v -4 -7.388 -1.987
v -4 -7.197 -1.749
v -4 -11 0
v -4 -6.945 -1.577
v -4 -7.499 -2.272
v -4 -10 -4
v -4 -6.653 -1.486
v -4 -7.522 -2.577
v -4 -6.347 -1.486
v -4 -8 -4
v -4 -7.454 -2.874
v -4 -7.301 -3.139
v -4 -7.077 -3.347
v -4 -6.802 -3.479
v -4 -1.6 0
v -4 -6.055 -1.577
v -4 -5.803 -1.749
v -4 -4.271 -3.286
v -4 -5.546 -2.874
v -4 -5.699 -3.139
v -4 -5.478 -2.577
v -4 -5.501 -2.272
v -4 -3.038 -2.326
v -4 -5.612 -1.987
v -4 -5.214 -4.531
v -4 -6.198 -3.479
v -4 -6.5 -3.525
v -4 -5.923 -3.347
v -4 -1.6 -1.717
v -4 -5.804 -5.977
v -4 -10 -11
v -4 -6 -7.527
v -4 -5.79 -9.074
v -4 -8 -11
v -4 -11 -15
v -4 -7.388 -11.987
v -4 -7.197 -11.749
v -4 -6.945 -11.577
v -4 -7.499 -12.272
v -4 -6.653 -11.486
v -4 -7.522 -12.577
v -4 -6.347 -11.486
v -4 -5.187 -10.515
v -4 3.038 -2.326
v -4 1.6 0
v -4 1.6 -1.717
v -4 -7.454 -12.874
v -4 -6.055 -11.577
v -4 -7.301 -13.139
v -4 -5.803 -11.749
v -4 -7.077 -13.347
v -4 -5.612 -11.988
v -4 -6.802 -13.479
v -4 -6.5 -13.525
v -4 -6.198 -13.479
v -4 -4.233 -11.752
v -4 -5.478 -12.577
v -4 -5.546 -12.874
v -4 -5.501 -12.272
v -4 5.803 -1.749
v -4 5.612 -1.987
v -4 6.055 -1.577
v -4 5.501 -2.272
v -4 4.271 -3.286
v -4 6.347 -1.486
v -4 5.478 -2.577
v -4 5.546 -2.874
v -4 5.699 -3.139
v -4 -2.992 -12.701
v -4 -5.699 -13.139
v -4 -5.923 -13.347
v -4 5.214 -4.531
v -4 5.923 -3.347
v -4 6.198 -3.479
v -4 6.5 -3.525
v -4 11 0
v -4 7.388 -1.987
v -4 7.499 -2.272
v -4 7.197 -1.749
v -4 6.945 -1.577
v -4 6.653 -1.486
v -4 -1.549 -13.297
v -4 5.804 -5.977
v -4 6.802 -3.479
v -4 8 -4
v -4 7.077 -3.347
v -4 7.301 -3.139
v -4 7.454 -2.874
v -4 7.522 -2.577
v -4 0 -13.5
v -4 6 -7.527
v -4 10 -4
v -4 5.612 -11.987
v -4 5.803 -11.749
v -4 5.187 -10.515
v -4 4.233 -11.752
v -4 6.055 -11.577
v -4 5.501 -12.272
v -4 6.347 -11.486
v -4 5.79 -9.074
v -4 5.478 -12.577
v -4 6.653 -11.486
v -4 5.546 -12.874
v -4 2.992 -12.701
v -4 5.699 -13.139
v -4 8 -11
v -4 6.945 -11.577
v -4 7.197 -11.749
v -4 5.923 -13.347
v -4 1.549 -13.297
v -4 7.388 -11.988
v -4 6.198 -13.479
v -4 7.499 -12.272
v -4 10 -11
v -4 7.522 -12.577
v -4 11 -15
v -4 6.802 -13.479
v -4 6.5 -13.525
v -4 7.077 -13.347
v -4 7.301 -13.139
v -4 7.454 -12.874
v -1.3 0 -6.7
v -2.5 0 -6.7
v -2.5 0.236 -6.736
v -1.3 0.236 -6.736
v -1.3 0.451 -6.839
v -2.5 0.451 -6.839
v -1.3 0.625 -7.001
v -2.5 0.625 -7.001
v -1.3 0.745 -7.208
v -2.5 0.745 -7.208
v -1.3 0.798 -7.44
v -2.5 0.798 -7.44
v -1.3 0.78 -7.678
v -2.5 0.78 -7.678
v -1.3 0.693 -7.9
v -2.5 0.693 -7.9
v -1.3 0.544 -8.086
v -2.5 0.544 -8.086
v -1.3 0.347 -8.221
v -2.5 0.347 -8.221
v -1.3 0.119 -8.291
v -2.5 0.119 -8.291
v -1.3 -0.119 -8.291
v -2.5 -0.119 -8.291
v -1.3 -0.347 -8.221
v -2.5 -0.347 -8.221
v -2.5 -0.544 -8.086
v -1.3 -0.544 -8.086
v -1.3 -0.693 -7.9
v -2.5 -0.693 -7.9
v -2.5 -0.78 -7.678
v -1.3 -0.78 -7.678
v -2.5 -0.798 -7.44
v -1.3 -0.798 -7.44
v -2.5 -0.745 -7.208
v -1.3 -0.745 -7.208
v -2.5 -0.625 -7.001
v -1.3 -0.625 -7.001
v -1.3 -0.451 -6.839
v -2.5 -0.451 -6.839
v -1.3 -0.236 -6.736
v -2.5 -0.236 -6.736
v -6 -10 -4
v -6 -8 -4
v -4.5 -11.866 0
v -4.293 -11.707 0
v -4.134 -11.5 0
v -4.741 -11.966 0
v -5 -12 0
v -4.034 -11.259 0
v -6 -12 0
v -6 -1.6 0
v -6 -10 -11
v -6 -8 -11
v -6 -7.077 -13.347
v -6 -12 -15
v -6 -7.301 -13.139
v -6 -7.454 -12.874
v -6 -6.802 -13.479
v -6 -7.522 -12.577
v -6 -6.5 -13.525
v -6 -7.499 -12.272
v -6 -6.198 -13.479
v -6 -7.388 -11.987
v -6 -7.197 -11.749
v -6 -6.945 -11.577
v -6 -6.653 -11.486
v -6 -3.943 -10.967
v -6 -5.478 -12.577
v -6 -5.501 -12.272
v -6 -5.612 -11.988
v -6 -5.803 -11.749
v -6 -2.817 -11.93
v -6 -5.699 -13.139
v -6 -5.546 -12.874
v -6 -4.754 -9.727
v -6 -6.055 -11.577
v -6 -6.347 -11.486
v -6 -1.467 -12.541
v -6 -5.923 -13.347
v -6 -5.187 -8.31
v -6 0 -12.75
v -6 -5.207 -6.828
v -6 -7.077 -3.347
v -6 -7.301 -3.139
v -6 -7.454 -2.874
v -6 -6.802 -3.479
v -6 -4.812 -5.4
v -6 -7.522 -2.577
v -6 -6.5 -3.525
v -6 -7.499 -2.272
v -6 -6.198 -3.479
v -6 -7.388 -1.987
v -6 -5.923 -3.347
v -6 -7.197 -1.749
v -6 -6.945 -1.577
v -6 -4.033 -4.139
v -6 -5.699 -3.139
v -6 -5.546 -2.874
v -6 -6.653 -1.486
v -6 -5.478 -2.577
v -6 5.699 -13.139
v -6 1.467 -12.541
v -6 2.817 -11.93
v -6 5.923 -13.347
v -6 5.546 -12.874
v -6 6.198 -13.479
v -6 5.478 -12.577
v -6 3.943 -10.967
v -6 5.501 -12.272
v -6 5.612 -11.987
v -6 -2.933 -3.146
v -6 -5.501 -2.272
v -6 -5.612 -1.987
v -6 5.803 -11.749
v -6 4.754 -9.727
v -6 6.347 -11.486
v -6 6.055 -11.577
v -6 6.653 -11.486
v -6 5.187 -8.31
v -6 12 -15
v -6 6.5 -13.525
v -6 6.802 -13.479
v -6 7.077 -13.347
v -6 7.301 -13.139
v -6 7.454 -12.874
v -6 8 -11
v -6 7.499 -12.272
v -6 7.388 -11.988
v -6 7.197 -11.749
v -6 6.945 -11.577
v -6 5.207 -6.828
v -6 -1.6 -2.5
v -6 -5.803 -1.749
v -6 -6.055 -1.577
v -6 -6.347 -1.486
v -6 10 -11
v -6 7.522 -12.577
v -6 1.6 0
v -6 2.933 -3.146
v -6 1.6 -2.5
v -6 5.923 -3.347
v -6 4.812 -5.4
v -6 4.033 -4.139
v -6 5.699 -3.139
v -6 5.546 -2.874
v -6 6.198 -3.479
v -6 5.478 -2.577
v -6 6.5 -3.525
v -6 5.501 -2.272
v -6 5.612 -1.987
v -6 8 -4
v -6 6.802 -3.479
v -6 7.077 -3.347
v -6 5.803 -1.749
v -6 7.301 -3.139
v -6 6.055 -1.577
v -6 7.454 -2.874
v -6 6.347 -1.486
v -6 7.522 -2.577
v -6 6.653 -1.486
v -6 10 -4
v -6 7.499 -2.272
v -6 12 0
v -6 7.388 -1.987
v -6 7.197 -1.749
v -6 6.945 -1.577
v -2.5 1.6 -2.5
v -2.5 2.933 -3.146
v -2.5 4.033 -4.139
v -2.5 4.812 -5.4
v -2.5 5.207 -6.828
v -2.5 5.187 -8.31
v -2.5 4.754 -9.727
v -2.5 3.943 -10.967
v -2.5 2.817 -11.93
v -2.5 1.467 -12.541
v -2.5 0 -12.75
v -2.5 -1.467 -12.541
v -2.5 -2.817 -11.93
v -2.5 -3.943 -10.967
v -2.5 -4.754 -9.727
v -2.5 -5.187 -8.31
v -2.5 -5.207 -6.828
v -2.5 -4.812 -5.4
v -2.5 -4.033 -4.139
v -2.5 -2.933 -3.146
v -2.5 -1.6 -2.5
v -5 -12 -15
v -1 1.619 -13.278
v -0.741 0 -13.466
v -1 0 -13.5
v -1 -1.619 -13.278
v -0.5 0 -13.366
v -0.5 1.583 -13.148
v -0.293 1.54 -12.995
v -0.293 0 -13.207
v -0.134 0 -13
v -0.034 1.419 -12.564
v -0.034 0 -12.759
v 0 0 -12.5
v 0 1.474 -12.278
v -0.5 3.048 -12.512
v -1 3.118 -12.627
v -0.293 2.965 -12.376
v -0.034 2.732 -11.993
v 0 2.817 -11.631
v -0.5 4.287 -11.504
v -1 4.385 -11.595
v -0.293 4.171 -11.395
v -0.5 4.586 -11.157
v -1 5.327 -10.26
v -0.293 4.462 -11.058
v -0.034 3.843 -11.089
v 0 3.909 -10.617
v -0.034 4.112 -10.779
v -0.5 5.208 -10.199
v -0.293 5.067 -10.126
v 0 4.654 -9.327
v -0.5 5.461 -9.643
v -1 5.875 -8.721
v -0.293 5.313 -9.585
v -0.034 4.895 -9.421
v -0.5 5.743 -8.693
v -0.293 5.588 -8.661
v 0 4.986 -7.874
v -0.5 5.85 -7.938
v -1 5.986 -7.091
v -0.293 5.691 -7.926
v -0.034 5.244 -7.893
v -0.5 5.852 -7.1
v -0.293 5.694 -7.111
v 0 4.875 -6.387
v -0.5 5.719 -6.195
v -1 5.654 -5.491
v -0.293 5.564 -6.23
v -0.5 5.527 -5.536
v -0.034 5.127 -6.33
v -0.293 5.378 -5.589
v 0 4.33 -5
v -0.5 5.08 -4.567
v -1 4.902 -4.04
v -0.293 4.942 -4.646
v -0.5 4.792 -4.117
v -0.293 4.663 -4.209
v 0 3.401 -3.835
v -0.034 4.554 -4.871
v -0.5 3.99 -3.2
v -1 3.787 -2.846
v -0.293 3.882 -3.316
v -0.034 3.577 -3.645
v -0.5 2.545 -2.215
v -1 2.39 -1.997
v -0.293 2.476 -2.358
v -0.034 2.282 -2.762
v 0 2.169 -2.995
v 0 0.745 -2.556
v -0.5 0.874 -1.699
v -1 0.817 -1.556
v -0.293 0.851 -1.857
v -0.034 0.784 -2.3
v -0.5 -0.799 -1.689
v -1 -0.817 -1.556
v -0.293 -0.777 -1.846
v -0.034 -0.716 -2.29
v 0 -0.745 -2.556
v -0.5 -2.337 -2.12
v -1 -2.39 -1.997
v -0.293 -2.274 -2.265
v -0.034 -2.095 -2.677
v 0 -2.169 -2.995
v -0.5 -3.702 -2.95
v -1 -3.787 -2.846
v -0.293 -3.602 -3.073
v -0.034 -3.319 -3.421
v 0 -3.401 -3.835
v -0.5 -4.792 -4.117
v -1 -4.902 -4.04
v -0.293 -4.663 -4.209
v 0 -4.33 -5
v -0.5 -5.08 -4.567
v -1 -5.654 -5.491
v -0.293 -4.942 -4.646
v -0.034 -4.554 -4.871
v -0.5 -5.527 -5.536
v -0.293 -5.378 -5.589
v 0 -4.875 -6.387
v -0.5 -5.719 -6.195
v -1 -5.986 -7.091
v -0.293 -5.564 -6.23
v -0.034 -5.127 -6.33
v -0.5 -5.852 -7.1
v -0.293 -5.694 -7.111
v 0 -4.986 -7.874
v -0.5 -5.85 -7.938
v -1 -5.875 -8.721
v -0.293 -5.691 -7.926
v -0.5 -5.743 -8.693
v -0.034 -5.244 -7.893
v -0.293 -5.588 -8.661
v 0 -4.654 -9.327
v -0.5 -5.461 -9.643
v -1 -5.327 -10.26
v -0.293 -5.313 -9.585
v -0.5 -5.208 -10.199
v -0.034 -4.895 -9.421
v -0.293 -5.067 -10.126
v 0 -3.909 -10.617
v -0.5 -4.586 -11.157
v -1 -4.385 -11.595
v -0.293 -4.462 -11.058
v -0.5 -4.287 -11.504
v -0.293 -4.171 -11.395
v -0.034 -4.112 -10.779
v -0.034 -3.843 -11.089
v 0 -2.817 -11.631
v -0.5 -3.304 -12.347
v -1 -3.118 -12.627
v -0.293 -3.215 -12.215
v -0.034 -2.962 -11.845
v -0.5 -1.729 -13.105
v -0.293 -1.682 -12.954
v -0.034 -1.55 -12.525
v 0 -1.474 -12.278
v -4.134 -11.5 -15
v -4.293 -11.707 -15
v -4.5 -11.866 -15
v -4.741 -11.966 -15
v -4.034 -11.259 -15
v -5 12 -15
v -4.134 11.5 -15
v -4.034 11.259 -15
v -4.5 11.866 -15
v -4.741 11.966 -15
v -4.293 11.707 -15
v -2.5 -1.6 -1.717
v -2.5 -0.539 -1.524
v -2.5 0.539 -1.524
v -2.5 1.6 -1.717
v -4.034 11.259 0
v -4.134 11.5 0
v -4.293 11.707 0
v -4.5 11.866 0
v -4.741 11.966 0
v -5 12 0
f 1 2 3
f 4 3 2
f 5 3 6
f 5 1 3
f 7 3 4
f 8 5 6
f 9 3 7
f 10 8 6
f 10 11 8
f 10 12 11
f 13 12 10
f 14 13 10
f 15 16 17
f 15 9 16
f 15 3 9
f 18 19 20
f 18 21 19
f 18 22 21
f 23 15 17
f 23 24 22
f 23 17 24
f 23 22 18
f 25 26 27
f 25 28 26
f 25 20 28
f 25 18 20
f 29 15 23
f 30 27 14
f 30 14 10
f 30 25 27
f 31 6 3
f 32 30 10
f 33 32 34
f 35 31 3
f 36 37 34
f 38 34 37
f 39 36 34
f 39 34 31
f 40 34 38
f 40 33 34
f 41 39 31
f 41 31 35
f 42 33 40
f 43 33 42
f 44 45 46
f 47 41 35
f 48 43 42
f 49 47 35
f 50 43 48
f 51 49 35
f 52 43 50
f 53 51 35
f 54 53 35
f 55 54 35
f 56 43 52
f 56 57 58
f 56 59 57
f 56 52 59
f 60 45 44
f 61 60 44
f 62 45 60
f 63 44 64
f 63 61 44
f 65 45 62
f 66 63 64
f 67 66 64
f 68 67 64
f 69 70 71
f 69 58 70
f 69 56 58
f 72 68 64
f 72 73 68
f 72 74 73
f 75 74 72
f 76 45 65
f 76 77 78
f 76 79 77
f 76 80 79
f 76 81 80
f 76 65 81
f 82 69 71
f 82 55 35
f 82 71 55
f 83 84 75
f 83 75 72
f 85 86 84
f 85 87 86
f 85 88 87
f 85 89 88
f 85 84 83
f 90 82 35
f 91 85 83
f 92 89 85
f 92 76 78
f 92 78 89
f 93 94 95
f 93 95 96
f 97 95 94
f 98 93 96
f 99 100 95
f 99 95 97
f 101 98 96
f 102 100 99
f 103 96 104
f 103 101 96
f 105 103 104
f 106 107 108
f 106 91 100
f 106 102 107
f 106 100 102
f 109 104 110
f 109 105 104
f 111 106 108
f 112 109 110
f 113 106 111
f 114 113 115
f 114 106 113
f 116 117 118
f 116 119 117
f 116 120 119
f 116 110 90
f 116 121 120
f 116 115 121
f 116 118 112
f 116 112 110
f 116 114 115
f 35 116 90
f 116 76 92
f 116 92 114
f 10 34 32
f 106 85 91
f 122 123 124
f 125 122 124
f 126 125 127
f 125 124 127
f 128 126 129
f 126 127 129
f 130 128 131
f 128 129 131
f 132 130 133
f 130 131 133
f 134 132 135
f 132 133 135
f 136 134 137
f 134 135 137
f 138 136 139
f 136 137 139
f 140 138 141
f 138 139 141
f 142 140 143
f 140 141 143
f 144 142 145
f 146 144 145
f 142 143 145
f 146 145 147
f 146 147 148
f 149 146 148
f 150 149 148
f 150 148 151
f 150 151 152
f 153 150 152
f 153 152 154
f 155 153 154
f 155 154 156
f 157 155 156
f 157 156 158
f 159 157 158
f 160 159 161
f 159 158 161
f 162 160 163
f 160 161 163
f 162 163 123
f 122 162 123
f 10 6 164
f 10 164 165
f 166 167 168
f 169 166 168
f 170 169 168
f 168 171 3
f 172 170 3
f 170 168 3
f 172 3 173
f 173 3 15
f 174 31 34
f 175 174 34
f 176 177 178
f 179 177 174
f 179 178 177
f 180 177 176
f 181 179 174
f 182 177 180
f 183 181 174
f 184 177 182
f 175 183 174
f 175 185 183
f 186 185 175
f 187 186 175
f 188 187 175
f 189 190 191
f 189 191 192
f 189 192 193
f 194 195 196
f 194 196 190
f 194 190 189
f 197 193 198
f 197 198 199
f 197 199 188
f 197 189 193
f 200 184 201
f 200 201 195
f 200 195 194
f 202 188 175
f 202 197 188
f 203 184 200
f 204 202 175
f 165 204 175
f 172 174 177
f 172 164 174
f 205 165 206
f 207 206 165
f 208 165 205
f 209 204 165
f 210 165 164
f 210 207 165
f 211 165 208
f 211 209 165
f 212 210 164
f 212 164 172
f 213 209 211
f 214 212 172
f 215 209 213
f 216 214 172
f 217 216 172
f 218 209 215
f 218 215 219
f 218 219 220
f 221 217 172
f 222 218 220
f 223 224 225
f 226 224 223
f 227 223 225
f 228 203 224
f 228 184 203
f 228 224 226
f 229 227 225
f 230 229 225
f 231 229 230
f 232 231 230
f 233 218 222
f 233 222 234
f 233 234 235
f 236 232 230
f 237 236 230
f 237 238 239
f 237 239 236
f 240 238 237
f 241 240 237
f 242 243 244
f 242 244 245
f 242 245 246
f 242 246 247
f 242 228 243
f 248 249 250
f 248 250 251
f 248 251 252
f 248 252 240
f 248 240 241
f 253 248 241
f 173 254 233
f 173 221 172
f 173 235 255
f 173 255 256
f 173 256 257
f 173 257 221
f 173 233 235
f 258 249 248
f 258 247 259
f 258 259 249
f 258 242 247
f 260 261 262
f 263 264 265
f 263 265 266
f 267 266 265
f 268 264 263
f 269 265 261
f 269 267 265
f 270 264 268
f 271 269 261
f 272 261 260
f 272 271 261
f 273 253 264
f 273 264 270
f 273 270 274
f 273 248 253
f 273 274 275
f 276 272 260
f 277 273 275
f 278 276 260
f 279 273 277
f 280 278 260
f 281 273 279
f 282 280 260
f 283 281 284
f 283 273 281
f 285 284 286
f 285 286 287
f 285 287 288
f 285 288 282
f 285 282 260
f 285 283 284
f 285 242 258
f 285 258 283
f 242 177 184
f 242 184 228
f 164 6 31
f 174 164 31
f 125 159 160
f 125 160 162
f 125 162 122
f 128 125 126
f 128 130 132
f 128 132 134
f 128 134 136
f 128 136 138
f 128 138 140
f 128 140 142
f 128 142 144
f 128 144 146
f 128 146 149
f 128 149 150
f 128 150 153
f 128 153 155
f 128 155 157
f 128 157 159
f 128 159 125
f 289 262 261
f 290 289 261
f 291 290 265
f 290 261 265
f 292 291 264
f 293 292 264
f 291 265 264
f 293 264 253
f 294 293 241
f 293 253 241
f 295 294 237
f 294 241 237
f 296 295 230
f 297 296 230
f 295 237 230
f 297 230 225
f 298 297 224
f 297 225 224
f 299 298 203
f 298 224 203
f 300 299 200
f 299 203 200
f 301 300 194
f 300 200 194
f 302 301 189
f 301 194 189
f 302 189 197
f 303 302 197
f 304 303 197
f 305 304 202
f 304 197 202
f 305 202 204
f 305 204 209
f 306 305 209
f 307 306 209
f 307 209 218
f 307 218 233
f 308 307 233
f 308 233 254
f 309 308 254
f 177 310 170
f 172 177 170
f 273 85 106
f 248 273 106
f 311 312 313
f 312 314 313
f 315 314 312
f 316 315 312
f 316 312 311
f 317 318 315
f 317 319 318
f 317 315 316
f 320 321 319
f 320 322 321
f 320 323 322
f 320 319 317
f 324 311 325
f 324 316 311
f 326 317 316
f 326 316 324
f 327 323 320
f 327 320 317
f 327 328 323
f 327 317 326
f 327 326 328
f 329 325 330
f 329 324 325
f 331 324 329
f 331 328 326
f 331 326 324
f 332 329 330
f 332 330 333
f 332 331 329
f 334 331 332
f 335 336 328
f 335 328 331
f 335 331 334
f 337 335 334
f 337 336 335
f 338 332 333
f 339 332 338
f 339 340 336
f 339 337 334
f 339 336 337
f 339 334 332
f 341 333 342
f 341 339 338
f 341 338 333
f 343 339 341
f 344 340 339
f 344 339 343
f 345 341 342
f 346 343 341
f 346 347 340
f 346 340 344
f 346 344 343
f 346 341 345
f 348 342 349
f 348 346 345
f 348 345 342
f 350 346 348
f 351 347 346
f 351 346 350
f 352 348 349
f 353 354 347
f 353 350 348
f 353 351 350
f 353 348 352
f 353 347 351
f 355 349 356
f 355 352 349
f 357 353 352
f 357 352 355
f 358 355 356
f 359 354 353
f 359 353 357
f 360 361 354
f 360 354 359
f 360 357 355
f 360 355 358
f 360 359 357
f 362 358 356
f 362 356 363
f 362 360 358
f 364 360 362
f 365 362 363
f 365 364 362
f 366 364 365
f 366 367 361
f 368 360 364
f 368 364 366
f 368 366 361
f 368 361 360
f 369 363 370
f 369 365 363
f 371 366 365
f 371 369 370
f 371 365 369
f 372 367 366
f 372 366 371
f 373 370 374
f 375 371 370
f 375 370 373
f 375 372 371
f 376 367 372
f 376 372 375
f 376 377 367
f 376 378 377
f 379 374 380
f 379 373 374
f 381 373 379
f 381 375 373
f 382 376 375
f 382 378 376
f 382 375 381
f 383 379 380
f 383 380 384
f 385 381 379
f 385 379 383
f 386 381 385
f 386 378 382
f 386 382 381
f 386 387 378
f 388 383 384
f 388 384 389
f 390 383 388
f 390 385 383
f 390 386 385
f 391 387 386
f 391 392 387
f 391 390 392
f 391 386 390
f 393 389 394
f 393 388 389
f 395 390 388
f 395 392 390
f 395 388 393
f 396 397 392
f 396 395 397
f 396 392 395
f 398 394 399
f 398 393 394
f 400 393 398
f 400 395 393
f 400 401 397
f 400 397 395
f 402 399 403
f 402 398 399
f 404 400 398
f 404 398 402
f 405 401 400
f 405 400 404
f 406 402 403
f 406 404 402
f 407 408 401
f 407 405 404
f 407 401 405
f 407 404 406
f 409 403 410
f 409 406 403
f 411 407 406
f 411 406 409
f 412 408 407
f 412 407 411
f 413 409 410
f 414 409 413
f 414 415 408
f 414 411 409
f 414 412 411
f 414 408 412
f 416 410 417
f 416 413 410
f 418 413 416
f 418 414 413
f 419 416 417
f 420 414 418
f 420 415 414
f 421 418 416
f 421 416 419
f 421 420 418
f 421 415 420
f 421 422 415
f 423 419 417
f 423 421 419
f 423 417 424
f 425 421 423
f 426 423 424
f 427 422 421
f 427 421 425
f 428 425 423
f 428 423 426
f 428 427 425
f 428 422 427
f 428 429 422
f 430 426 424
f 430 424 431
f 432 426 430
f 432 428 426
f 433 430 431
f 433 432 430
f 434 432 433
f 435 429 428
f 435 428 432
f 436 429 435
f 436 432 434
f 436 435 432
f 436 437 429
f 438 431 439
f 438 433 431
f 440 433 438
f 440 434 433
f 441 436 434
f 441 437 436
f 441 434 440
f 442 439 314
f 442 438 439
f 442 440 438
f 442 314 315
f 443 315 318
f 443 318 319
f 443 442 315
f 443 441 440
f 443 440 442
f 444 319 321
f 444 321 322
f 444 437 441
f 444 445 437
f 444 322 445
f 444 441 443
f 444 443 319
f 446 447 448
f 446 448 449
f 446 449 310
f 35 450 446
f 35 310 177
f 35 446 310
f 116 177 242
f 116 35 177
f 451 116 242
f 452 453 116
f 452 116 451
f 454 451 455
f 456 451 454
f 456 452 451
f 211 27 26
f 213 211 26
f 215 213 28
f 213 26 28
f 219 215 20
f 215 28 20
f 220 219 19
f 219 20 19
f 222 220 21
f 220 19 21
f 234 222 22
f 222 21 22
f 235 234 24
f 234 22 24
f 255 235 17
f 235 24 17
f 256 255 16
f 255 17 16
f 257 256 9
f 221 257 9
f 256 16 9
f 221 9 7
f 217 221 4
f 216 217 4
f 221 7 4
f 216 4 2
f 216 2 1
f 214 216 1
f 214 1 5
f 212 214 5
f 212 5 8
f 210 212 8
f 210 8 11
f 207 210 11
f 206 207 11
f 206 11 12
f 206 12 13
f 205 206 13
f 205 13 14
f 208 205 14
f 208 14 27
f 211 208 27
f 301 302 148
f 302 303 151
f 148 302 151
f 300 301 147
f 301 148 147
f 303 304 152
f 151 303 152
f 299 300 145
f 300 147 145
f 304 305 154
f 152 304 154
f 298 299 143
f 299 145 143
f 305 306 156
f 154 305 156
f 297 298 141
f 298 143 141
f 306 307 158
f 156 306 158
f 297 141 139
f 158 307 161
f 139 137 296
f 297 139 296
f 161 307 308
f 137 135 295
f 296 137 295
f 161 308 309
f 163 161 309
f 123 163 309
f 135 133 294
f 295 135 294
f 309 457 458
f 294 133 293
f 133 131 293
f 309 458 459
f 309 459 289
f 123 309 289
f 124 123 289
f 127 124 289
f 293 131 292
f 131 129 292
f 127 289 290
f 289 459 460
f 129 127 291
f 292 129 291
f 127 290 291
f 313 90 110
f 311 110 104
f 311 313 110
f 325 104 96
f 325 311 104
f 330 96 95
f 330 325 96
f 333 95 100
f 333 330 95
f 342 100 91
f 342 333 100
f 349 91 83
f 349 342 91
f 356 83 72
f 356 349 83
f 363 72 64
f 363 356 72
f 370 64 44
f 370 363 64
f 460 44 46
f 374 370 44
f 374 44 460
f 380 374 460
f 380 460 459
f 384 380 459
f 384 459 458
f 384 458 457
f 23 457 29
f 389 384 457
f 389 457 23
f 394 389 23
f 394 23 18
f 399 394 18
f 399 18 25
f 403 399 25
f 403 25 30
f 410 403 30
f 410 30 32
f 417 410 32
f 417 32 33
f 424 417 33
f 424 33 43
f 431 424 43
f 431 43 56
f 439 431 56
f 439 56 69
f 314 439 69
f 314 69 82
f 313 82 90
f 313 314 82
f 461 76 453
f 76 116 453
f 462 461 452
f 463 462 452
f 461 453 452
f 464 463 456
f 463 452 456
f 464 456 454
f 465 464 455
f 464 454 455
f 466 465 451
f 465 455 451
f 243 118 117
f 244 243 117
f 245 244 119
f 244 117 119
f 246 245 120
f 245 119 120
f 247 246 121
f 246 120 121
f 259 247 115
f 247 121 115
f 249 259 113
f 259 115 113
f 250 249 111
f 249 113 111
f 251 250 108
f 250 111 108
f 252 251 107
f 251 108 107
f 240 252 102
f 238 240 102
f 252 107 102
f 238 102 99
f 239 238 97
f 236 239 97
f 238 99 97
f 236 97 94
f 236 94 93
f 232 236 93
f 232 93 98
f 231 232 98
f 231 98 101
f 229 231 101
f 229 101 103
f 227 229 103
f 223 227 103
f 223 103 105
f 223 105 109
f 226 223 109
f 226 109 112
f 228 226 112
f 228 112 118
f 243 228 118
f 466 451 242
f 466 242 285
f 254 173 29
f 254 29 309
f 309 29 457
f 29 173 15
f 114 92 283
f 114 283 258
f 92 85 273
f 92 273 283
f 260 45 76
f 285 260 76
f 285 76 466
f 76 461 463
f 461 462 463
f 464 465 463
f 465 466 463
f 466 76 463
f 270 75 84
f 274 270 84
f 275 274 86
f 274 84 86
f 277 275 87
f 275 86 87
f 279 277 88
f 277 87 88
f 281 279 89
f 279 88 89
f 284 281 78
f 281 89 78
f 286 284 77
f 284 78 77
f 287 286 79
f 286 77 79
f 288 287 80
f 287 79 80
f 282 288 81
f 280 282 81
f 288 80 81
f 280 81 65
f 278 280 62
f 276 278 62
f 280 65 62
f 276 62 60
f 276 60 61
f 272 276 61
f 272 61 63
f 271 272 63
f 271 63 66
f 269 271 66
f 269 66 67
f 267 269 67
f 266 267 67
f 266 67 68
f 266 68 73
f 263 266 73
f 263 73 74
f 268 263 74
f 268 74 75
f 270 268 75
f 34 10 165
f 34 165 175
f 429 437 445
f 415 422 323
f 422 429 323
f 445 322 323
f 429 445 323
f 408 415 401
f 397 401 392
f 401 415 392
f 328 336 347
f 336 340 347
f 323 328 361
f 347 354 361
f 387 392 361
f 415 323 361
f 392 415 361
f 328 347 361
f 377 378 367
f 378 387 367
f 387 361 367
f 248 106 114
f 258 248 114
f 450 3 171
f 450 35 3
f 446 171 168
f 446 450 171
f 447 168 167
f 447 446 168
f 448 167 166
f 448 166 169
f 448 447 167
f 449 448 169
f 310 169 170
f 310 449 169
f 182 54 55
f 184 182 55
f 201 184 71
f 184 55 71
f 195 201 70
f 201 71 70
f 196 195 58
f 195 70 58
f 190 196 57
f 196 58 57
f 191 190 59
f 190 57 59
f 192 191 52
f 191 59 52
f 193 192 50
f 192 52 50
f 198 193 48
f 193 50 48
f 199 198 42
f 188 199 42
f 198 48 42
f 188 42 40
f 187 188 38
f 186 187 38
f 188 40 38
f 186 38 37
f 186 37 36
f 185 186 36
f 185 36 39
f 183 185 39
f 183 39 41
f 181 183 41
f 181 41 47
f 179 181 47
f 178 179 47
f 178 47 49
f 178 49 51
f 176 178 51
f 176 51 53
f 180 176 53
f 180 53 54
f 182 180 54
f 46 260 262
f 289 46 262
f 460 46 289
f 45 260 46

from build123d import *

# Parameters (mm, degrees)
SKETCH1_W                    = 15
SKETCH1_H                    = 24
BOSS_EXTRUDE1_DEPTH          = 6
SKETCH2_R                    = 5.25
CUT_EXTRUDE1_DEPTH           = 3.5
CUT_EXTRUDE2_REACH           = 24.136
CUT_EXTRUDE2_END_RADIUS      = 5.25
SKETCH3_W                    = 3.5
SKETCH3_H                    = 3.2
SKETCH4_W                    = 7
SKETCH4_H                    = 2
CUT_EXTRUDE3_DEPTH           = 10
SKETCH5_R                    = 0.8
CUT_EXTRUDE4_DEPTH           = 1.2
SKETCH6_OUTSIDE_W            = 22.786
SKETCH6_OUTSIDE_H            = 31.786
SKETCH6_OUTSIDE_R            = 6
CUT_EXTRUDE5_DEPTH           = 4
M2_5X0_45_TAPPED_HOLE1_D     = 2.05
M2_5X0_45_TAPPED_HOLE1_DEPTH = 6.35
M2_5X0_45_TAPPED_HOLE1_TIP   = 0.615882135
FILLET1_R                    = 1


with BuildPart() as part:
    # Sketch1 → Boss-Extrude1 (new body)
    with BuildSketch(Plane(origin=(0, 0, -7.5), x_dir=(0, 0, 1), z_dir=(-1, 0, 0))):
        Rectangle(SKETCH1_W, SKETCH1_H)
    extrude(amount=BOSS_EXTRUDE1_DEPTH)

    # Sketch2 → Cut-Extrude1 (cut)
    with BuildSketch(Plane.ZY.offset(6)):
        with Locations((-7.5, 0)):
            Circle(SKETCH2_R)
    extrude(amount=-CUT_EXTRUDE1_DEPTH, mode=Mode.SUBTRACT)

    # Cut-Extrude2: up to this cylinder (the profile starts outside it)
    cut_extrude2_end = Plane(origin=(-4.25, 0, -7.5), z_dir=(-1, 0, 0)) * Cylinder(CUT_EXTRUDE2_END_RADIUS, 59.772, mode=Mode.PRIVATE)
    # Sketch3 → Cut-Extrude2 (cut, up to the surface)
    with BuildSketch(Plane(origin=(5, 0, 0), x_dir=(1, 0, 0), z_dir=(0, 0, 1)), mode=Mode.PRIVATE) as cut_extrude2_sk1:
        with Locations((-9.25, 0)):
            Rectangle(SKETCH3_W, SKETCH3_H)
    cut_extrude2_tool1 = extrude(cut_extrude2_sk1.sketch, amount=-CUT_EXTRUDE2_REACH, mode=Mode.PRIVATE) - cut_extrude2_end
    add(cut_extrude2_tool1.solids().sort_by_distance((-4.25, 0, 0))[0], mode=Mode.SUBTRACT)

    # Sketch4 → Cut-Extrude3 (cut)
    with BuildSketch(Plane(origin=(0, 0, 0), x_dir=(0, 0, -1), z_dir=(1, 0, 0))):
        with Locations((7.5, 9)):
            Rectangle(SKETCH4_W, SKETCH4_H)
        with Locations((7.5, -9)):
            Rectangle(SKETCH4_W, SKETCH4_H)
    extrude(amount=-CUT_EXTRUDE3_DEPTH, mode=Mode.SUBTRACT)

    # Sketch5 → Cut-Extrude4 (cut)
    with BuildSketch(Plane.ZY.offset(2.5)):
        with Locations((-7.5, 0)):
            Circle(SKETCH5_R)
    extrude(amount=-CUT_EXTRUDE4_DEPTH, mode=Mode.SUBTRACT)

    # Sketch6 outside → Cut-Extrude5 (cut)
    with BuildSketch(Plane(origin=(0, 0, 0), x_dir=(0, 0, -1), z_dir=(1, 0, 0))):
        with Locations((7.5, 0)):
            Rectangle(SKETCH6_OUTSIDE_W, SKETCH6_OUTSIDE_H)
        with Locations((7.5, 0)):
            Circle(SKETCH6_OUTSIDE_R, mode=Mode.SUBTRACT)
    extrude(amount=-CUT_EXTRUDE5_DEPTH, mode=Mode.SUBTRACT)

    # M2.5x0.45 Tapped Hole1
    with Locations(Plane.ZY.offset(6)):
        with Locations((-12.5, 6.5), (-2.5, 6.5), (-2.5, -6.5), (-12.5, -6.5)):
            Hole(M2_5X0_45_TAPPED_HOLE1_D / 2, depth=M2_5X0_45_TAPPED_HOLE1_DEPTH)
            with Locations((0, 0, -(M2_5X0_45_TAPPED_HOLE1_DEPTH + M2_5X0_45_TAPPED_HOLE1_TIP / 2))):  # 118° drill point
                Cone(0, M2_5X0_45_TAPPED_HOLE1_D / 2, M2_5X0_45_TAPPED_HOLE1_TIP, mode=Mode.SUBTRACT)

    # Fillet1
    fillet1_edges = [part.edges().sort_by_distance(p)[0] for p in [
        (0, 0, -1.5),
        (-4, -12, -7.5),
        (-4, 12, -7.5),
    ]]
    fillet(fillet1_edges, radius=FILLET1_R)


solid = part.part
